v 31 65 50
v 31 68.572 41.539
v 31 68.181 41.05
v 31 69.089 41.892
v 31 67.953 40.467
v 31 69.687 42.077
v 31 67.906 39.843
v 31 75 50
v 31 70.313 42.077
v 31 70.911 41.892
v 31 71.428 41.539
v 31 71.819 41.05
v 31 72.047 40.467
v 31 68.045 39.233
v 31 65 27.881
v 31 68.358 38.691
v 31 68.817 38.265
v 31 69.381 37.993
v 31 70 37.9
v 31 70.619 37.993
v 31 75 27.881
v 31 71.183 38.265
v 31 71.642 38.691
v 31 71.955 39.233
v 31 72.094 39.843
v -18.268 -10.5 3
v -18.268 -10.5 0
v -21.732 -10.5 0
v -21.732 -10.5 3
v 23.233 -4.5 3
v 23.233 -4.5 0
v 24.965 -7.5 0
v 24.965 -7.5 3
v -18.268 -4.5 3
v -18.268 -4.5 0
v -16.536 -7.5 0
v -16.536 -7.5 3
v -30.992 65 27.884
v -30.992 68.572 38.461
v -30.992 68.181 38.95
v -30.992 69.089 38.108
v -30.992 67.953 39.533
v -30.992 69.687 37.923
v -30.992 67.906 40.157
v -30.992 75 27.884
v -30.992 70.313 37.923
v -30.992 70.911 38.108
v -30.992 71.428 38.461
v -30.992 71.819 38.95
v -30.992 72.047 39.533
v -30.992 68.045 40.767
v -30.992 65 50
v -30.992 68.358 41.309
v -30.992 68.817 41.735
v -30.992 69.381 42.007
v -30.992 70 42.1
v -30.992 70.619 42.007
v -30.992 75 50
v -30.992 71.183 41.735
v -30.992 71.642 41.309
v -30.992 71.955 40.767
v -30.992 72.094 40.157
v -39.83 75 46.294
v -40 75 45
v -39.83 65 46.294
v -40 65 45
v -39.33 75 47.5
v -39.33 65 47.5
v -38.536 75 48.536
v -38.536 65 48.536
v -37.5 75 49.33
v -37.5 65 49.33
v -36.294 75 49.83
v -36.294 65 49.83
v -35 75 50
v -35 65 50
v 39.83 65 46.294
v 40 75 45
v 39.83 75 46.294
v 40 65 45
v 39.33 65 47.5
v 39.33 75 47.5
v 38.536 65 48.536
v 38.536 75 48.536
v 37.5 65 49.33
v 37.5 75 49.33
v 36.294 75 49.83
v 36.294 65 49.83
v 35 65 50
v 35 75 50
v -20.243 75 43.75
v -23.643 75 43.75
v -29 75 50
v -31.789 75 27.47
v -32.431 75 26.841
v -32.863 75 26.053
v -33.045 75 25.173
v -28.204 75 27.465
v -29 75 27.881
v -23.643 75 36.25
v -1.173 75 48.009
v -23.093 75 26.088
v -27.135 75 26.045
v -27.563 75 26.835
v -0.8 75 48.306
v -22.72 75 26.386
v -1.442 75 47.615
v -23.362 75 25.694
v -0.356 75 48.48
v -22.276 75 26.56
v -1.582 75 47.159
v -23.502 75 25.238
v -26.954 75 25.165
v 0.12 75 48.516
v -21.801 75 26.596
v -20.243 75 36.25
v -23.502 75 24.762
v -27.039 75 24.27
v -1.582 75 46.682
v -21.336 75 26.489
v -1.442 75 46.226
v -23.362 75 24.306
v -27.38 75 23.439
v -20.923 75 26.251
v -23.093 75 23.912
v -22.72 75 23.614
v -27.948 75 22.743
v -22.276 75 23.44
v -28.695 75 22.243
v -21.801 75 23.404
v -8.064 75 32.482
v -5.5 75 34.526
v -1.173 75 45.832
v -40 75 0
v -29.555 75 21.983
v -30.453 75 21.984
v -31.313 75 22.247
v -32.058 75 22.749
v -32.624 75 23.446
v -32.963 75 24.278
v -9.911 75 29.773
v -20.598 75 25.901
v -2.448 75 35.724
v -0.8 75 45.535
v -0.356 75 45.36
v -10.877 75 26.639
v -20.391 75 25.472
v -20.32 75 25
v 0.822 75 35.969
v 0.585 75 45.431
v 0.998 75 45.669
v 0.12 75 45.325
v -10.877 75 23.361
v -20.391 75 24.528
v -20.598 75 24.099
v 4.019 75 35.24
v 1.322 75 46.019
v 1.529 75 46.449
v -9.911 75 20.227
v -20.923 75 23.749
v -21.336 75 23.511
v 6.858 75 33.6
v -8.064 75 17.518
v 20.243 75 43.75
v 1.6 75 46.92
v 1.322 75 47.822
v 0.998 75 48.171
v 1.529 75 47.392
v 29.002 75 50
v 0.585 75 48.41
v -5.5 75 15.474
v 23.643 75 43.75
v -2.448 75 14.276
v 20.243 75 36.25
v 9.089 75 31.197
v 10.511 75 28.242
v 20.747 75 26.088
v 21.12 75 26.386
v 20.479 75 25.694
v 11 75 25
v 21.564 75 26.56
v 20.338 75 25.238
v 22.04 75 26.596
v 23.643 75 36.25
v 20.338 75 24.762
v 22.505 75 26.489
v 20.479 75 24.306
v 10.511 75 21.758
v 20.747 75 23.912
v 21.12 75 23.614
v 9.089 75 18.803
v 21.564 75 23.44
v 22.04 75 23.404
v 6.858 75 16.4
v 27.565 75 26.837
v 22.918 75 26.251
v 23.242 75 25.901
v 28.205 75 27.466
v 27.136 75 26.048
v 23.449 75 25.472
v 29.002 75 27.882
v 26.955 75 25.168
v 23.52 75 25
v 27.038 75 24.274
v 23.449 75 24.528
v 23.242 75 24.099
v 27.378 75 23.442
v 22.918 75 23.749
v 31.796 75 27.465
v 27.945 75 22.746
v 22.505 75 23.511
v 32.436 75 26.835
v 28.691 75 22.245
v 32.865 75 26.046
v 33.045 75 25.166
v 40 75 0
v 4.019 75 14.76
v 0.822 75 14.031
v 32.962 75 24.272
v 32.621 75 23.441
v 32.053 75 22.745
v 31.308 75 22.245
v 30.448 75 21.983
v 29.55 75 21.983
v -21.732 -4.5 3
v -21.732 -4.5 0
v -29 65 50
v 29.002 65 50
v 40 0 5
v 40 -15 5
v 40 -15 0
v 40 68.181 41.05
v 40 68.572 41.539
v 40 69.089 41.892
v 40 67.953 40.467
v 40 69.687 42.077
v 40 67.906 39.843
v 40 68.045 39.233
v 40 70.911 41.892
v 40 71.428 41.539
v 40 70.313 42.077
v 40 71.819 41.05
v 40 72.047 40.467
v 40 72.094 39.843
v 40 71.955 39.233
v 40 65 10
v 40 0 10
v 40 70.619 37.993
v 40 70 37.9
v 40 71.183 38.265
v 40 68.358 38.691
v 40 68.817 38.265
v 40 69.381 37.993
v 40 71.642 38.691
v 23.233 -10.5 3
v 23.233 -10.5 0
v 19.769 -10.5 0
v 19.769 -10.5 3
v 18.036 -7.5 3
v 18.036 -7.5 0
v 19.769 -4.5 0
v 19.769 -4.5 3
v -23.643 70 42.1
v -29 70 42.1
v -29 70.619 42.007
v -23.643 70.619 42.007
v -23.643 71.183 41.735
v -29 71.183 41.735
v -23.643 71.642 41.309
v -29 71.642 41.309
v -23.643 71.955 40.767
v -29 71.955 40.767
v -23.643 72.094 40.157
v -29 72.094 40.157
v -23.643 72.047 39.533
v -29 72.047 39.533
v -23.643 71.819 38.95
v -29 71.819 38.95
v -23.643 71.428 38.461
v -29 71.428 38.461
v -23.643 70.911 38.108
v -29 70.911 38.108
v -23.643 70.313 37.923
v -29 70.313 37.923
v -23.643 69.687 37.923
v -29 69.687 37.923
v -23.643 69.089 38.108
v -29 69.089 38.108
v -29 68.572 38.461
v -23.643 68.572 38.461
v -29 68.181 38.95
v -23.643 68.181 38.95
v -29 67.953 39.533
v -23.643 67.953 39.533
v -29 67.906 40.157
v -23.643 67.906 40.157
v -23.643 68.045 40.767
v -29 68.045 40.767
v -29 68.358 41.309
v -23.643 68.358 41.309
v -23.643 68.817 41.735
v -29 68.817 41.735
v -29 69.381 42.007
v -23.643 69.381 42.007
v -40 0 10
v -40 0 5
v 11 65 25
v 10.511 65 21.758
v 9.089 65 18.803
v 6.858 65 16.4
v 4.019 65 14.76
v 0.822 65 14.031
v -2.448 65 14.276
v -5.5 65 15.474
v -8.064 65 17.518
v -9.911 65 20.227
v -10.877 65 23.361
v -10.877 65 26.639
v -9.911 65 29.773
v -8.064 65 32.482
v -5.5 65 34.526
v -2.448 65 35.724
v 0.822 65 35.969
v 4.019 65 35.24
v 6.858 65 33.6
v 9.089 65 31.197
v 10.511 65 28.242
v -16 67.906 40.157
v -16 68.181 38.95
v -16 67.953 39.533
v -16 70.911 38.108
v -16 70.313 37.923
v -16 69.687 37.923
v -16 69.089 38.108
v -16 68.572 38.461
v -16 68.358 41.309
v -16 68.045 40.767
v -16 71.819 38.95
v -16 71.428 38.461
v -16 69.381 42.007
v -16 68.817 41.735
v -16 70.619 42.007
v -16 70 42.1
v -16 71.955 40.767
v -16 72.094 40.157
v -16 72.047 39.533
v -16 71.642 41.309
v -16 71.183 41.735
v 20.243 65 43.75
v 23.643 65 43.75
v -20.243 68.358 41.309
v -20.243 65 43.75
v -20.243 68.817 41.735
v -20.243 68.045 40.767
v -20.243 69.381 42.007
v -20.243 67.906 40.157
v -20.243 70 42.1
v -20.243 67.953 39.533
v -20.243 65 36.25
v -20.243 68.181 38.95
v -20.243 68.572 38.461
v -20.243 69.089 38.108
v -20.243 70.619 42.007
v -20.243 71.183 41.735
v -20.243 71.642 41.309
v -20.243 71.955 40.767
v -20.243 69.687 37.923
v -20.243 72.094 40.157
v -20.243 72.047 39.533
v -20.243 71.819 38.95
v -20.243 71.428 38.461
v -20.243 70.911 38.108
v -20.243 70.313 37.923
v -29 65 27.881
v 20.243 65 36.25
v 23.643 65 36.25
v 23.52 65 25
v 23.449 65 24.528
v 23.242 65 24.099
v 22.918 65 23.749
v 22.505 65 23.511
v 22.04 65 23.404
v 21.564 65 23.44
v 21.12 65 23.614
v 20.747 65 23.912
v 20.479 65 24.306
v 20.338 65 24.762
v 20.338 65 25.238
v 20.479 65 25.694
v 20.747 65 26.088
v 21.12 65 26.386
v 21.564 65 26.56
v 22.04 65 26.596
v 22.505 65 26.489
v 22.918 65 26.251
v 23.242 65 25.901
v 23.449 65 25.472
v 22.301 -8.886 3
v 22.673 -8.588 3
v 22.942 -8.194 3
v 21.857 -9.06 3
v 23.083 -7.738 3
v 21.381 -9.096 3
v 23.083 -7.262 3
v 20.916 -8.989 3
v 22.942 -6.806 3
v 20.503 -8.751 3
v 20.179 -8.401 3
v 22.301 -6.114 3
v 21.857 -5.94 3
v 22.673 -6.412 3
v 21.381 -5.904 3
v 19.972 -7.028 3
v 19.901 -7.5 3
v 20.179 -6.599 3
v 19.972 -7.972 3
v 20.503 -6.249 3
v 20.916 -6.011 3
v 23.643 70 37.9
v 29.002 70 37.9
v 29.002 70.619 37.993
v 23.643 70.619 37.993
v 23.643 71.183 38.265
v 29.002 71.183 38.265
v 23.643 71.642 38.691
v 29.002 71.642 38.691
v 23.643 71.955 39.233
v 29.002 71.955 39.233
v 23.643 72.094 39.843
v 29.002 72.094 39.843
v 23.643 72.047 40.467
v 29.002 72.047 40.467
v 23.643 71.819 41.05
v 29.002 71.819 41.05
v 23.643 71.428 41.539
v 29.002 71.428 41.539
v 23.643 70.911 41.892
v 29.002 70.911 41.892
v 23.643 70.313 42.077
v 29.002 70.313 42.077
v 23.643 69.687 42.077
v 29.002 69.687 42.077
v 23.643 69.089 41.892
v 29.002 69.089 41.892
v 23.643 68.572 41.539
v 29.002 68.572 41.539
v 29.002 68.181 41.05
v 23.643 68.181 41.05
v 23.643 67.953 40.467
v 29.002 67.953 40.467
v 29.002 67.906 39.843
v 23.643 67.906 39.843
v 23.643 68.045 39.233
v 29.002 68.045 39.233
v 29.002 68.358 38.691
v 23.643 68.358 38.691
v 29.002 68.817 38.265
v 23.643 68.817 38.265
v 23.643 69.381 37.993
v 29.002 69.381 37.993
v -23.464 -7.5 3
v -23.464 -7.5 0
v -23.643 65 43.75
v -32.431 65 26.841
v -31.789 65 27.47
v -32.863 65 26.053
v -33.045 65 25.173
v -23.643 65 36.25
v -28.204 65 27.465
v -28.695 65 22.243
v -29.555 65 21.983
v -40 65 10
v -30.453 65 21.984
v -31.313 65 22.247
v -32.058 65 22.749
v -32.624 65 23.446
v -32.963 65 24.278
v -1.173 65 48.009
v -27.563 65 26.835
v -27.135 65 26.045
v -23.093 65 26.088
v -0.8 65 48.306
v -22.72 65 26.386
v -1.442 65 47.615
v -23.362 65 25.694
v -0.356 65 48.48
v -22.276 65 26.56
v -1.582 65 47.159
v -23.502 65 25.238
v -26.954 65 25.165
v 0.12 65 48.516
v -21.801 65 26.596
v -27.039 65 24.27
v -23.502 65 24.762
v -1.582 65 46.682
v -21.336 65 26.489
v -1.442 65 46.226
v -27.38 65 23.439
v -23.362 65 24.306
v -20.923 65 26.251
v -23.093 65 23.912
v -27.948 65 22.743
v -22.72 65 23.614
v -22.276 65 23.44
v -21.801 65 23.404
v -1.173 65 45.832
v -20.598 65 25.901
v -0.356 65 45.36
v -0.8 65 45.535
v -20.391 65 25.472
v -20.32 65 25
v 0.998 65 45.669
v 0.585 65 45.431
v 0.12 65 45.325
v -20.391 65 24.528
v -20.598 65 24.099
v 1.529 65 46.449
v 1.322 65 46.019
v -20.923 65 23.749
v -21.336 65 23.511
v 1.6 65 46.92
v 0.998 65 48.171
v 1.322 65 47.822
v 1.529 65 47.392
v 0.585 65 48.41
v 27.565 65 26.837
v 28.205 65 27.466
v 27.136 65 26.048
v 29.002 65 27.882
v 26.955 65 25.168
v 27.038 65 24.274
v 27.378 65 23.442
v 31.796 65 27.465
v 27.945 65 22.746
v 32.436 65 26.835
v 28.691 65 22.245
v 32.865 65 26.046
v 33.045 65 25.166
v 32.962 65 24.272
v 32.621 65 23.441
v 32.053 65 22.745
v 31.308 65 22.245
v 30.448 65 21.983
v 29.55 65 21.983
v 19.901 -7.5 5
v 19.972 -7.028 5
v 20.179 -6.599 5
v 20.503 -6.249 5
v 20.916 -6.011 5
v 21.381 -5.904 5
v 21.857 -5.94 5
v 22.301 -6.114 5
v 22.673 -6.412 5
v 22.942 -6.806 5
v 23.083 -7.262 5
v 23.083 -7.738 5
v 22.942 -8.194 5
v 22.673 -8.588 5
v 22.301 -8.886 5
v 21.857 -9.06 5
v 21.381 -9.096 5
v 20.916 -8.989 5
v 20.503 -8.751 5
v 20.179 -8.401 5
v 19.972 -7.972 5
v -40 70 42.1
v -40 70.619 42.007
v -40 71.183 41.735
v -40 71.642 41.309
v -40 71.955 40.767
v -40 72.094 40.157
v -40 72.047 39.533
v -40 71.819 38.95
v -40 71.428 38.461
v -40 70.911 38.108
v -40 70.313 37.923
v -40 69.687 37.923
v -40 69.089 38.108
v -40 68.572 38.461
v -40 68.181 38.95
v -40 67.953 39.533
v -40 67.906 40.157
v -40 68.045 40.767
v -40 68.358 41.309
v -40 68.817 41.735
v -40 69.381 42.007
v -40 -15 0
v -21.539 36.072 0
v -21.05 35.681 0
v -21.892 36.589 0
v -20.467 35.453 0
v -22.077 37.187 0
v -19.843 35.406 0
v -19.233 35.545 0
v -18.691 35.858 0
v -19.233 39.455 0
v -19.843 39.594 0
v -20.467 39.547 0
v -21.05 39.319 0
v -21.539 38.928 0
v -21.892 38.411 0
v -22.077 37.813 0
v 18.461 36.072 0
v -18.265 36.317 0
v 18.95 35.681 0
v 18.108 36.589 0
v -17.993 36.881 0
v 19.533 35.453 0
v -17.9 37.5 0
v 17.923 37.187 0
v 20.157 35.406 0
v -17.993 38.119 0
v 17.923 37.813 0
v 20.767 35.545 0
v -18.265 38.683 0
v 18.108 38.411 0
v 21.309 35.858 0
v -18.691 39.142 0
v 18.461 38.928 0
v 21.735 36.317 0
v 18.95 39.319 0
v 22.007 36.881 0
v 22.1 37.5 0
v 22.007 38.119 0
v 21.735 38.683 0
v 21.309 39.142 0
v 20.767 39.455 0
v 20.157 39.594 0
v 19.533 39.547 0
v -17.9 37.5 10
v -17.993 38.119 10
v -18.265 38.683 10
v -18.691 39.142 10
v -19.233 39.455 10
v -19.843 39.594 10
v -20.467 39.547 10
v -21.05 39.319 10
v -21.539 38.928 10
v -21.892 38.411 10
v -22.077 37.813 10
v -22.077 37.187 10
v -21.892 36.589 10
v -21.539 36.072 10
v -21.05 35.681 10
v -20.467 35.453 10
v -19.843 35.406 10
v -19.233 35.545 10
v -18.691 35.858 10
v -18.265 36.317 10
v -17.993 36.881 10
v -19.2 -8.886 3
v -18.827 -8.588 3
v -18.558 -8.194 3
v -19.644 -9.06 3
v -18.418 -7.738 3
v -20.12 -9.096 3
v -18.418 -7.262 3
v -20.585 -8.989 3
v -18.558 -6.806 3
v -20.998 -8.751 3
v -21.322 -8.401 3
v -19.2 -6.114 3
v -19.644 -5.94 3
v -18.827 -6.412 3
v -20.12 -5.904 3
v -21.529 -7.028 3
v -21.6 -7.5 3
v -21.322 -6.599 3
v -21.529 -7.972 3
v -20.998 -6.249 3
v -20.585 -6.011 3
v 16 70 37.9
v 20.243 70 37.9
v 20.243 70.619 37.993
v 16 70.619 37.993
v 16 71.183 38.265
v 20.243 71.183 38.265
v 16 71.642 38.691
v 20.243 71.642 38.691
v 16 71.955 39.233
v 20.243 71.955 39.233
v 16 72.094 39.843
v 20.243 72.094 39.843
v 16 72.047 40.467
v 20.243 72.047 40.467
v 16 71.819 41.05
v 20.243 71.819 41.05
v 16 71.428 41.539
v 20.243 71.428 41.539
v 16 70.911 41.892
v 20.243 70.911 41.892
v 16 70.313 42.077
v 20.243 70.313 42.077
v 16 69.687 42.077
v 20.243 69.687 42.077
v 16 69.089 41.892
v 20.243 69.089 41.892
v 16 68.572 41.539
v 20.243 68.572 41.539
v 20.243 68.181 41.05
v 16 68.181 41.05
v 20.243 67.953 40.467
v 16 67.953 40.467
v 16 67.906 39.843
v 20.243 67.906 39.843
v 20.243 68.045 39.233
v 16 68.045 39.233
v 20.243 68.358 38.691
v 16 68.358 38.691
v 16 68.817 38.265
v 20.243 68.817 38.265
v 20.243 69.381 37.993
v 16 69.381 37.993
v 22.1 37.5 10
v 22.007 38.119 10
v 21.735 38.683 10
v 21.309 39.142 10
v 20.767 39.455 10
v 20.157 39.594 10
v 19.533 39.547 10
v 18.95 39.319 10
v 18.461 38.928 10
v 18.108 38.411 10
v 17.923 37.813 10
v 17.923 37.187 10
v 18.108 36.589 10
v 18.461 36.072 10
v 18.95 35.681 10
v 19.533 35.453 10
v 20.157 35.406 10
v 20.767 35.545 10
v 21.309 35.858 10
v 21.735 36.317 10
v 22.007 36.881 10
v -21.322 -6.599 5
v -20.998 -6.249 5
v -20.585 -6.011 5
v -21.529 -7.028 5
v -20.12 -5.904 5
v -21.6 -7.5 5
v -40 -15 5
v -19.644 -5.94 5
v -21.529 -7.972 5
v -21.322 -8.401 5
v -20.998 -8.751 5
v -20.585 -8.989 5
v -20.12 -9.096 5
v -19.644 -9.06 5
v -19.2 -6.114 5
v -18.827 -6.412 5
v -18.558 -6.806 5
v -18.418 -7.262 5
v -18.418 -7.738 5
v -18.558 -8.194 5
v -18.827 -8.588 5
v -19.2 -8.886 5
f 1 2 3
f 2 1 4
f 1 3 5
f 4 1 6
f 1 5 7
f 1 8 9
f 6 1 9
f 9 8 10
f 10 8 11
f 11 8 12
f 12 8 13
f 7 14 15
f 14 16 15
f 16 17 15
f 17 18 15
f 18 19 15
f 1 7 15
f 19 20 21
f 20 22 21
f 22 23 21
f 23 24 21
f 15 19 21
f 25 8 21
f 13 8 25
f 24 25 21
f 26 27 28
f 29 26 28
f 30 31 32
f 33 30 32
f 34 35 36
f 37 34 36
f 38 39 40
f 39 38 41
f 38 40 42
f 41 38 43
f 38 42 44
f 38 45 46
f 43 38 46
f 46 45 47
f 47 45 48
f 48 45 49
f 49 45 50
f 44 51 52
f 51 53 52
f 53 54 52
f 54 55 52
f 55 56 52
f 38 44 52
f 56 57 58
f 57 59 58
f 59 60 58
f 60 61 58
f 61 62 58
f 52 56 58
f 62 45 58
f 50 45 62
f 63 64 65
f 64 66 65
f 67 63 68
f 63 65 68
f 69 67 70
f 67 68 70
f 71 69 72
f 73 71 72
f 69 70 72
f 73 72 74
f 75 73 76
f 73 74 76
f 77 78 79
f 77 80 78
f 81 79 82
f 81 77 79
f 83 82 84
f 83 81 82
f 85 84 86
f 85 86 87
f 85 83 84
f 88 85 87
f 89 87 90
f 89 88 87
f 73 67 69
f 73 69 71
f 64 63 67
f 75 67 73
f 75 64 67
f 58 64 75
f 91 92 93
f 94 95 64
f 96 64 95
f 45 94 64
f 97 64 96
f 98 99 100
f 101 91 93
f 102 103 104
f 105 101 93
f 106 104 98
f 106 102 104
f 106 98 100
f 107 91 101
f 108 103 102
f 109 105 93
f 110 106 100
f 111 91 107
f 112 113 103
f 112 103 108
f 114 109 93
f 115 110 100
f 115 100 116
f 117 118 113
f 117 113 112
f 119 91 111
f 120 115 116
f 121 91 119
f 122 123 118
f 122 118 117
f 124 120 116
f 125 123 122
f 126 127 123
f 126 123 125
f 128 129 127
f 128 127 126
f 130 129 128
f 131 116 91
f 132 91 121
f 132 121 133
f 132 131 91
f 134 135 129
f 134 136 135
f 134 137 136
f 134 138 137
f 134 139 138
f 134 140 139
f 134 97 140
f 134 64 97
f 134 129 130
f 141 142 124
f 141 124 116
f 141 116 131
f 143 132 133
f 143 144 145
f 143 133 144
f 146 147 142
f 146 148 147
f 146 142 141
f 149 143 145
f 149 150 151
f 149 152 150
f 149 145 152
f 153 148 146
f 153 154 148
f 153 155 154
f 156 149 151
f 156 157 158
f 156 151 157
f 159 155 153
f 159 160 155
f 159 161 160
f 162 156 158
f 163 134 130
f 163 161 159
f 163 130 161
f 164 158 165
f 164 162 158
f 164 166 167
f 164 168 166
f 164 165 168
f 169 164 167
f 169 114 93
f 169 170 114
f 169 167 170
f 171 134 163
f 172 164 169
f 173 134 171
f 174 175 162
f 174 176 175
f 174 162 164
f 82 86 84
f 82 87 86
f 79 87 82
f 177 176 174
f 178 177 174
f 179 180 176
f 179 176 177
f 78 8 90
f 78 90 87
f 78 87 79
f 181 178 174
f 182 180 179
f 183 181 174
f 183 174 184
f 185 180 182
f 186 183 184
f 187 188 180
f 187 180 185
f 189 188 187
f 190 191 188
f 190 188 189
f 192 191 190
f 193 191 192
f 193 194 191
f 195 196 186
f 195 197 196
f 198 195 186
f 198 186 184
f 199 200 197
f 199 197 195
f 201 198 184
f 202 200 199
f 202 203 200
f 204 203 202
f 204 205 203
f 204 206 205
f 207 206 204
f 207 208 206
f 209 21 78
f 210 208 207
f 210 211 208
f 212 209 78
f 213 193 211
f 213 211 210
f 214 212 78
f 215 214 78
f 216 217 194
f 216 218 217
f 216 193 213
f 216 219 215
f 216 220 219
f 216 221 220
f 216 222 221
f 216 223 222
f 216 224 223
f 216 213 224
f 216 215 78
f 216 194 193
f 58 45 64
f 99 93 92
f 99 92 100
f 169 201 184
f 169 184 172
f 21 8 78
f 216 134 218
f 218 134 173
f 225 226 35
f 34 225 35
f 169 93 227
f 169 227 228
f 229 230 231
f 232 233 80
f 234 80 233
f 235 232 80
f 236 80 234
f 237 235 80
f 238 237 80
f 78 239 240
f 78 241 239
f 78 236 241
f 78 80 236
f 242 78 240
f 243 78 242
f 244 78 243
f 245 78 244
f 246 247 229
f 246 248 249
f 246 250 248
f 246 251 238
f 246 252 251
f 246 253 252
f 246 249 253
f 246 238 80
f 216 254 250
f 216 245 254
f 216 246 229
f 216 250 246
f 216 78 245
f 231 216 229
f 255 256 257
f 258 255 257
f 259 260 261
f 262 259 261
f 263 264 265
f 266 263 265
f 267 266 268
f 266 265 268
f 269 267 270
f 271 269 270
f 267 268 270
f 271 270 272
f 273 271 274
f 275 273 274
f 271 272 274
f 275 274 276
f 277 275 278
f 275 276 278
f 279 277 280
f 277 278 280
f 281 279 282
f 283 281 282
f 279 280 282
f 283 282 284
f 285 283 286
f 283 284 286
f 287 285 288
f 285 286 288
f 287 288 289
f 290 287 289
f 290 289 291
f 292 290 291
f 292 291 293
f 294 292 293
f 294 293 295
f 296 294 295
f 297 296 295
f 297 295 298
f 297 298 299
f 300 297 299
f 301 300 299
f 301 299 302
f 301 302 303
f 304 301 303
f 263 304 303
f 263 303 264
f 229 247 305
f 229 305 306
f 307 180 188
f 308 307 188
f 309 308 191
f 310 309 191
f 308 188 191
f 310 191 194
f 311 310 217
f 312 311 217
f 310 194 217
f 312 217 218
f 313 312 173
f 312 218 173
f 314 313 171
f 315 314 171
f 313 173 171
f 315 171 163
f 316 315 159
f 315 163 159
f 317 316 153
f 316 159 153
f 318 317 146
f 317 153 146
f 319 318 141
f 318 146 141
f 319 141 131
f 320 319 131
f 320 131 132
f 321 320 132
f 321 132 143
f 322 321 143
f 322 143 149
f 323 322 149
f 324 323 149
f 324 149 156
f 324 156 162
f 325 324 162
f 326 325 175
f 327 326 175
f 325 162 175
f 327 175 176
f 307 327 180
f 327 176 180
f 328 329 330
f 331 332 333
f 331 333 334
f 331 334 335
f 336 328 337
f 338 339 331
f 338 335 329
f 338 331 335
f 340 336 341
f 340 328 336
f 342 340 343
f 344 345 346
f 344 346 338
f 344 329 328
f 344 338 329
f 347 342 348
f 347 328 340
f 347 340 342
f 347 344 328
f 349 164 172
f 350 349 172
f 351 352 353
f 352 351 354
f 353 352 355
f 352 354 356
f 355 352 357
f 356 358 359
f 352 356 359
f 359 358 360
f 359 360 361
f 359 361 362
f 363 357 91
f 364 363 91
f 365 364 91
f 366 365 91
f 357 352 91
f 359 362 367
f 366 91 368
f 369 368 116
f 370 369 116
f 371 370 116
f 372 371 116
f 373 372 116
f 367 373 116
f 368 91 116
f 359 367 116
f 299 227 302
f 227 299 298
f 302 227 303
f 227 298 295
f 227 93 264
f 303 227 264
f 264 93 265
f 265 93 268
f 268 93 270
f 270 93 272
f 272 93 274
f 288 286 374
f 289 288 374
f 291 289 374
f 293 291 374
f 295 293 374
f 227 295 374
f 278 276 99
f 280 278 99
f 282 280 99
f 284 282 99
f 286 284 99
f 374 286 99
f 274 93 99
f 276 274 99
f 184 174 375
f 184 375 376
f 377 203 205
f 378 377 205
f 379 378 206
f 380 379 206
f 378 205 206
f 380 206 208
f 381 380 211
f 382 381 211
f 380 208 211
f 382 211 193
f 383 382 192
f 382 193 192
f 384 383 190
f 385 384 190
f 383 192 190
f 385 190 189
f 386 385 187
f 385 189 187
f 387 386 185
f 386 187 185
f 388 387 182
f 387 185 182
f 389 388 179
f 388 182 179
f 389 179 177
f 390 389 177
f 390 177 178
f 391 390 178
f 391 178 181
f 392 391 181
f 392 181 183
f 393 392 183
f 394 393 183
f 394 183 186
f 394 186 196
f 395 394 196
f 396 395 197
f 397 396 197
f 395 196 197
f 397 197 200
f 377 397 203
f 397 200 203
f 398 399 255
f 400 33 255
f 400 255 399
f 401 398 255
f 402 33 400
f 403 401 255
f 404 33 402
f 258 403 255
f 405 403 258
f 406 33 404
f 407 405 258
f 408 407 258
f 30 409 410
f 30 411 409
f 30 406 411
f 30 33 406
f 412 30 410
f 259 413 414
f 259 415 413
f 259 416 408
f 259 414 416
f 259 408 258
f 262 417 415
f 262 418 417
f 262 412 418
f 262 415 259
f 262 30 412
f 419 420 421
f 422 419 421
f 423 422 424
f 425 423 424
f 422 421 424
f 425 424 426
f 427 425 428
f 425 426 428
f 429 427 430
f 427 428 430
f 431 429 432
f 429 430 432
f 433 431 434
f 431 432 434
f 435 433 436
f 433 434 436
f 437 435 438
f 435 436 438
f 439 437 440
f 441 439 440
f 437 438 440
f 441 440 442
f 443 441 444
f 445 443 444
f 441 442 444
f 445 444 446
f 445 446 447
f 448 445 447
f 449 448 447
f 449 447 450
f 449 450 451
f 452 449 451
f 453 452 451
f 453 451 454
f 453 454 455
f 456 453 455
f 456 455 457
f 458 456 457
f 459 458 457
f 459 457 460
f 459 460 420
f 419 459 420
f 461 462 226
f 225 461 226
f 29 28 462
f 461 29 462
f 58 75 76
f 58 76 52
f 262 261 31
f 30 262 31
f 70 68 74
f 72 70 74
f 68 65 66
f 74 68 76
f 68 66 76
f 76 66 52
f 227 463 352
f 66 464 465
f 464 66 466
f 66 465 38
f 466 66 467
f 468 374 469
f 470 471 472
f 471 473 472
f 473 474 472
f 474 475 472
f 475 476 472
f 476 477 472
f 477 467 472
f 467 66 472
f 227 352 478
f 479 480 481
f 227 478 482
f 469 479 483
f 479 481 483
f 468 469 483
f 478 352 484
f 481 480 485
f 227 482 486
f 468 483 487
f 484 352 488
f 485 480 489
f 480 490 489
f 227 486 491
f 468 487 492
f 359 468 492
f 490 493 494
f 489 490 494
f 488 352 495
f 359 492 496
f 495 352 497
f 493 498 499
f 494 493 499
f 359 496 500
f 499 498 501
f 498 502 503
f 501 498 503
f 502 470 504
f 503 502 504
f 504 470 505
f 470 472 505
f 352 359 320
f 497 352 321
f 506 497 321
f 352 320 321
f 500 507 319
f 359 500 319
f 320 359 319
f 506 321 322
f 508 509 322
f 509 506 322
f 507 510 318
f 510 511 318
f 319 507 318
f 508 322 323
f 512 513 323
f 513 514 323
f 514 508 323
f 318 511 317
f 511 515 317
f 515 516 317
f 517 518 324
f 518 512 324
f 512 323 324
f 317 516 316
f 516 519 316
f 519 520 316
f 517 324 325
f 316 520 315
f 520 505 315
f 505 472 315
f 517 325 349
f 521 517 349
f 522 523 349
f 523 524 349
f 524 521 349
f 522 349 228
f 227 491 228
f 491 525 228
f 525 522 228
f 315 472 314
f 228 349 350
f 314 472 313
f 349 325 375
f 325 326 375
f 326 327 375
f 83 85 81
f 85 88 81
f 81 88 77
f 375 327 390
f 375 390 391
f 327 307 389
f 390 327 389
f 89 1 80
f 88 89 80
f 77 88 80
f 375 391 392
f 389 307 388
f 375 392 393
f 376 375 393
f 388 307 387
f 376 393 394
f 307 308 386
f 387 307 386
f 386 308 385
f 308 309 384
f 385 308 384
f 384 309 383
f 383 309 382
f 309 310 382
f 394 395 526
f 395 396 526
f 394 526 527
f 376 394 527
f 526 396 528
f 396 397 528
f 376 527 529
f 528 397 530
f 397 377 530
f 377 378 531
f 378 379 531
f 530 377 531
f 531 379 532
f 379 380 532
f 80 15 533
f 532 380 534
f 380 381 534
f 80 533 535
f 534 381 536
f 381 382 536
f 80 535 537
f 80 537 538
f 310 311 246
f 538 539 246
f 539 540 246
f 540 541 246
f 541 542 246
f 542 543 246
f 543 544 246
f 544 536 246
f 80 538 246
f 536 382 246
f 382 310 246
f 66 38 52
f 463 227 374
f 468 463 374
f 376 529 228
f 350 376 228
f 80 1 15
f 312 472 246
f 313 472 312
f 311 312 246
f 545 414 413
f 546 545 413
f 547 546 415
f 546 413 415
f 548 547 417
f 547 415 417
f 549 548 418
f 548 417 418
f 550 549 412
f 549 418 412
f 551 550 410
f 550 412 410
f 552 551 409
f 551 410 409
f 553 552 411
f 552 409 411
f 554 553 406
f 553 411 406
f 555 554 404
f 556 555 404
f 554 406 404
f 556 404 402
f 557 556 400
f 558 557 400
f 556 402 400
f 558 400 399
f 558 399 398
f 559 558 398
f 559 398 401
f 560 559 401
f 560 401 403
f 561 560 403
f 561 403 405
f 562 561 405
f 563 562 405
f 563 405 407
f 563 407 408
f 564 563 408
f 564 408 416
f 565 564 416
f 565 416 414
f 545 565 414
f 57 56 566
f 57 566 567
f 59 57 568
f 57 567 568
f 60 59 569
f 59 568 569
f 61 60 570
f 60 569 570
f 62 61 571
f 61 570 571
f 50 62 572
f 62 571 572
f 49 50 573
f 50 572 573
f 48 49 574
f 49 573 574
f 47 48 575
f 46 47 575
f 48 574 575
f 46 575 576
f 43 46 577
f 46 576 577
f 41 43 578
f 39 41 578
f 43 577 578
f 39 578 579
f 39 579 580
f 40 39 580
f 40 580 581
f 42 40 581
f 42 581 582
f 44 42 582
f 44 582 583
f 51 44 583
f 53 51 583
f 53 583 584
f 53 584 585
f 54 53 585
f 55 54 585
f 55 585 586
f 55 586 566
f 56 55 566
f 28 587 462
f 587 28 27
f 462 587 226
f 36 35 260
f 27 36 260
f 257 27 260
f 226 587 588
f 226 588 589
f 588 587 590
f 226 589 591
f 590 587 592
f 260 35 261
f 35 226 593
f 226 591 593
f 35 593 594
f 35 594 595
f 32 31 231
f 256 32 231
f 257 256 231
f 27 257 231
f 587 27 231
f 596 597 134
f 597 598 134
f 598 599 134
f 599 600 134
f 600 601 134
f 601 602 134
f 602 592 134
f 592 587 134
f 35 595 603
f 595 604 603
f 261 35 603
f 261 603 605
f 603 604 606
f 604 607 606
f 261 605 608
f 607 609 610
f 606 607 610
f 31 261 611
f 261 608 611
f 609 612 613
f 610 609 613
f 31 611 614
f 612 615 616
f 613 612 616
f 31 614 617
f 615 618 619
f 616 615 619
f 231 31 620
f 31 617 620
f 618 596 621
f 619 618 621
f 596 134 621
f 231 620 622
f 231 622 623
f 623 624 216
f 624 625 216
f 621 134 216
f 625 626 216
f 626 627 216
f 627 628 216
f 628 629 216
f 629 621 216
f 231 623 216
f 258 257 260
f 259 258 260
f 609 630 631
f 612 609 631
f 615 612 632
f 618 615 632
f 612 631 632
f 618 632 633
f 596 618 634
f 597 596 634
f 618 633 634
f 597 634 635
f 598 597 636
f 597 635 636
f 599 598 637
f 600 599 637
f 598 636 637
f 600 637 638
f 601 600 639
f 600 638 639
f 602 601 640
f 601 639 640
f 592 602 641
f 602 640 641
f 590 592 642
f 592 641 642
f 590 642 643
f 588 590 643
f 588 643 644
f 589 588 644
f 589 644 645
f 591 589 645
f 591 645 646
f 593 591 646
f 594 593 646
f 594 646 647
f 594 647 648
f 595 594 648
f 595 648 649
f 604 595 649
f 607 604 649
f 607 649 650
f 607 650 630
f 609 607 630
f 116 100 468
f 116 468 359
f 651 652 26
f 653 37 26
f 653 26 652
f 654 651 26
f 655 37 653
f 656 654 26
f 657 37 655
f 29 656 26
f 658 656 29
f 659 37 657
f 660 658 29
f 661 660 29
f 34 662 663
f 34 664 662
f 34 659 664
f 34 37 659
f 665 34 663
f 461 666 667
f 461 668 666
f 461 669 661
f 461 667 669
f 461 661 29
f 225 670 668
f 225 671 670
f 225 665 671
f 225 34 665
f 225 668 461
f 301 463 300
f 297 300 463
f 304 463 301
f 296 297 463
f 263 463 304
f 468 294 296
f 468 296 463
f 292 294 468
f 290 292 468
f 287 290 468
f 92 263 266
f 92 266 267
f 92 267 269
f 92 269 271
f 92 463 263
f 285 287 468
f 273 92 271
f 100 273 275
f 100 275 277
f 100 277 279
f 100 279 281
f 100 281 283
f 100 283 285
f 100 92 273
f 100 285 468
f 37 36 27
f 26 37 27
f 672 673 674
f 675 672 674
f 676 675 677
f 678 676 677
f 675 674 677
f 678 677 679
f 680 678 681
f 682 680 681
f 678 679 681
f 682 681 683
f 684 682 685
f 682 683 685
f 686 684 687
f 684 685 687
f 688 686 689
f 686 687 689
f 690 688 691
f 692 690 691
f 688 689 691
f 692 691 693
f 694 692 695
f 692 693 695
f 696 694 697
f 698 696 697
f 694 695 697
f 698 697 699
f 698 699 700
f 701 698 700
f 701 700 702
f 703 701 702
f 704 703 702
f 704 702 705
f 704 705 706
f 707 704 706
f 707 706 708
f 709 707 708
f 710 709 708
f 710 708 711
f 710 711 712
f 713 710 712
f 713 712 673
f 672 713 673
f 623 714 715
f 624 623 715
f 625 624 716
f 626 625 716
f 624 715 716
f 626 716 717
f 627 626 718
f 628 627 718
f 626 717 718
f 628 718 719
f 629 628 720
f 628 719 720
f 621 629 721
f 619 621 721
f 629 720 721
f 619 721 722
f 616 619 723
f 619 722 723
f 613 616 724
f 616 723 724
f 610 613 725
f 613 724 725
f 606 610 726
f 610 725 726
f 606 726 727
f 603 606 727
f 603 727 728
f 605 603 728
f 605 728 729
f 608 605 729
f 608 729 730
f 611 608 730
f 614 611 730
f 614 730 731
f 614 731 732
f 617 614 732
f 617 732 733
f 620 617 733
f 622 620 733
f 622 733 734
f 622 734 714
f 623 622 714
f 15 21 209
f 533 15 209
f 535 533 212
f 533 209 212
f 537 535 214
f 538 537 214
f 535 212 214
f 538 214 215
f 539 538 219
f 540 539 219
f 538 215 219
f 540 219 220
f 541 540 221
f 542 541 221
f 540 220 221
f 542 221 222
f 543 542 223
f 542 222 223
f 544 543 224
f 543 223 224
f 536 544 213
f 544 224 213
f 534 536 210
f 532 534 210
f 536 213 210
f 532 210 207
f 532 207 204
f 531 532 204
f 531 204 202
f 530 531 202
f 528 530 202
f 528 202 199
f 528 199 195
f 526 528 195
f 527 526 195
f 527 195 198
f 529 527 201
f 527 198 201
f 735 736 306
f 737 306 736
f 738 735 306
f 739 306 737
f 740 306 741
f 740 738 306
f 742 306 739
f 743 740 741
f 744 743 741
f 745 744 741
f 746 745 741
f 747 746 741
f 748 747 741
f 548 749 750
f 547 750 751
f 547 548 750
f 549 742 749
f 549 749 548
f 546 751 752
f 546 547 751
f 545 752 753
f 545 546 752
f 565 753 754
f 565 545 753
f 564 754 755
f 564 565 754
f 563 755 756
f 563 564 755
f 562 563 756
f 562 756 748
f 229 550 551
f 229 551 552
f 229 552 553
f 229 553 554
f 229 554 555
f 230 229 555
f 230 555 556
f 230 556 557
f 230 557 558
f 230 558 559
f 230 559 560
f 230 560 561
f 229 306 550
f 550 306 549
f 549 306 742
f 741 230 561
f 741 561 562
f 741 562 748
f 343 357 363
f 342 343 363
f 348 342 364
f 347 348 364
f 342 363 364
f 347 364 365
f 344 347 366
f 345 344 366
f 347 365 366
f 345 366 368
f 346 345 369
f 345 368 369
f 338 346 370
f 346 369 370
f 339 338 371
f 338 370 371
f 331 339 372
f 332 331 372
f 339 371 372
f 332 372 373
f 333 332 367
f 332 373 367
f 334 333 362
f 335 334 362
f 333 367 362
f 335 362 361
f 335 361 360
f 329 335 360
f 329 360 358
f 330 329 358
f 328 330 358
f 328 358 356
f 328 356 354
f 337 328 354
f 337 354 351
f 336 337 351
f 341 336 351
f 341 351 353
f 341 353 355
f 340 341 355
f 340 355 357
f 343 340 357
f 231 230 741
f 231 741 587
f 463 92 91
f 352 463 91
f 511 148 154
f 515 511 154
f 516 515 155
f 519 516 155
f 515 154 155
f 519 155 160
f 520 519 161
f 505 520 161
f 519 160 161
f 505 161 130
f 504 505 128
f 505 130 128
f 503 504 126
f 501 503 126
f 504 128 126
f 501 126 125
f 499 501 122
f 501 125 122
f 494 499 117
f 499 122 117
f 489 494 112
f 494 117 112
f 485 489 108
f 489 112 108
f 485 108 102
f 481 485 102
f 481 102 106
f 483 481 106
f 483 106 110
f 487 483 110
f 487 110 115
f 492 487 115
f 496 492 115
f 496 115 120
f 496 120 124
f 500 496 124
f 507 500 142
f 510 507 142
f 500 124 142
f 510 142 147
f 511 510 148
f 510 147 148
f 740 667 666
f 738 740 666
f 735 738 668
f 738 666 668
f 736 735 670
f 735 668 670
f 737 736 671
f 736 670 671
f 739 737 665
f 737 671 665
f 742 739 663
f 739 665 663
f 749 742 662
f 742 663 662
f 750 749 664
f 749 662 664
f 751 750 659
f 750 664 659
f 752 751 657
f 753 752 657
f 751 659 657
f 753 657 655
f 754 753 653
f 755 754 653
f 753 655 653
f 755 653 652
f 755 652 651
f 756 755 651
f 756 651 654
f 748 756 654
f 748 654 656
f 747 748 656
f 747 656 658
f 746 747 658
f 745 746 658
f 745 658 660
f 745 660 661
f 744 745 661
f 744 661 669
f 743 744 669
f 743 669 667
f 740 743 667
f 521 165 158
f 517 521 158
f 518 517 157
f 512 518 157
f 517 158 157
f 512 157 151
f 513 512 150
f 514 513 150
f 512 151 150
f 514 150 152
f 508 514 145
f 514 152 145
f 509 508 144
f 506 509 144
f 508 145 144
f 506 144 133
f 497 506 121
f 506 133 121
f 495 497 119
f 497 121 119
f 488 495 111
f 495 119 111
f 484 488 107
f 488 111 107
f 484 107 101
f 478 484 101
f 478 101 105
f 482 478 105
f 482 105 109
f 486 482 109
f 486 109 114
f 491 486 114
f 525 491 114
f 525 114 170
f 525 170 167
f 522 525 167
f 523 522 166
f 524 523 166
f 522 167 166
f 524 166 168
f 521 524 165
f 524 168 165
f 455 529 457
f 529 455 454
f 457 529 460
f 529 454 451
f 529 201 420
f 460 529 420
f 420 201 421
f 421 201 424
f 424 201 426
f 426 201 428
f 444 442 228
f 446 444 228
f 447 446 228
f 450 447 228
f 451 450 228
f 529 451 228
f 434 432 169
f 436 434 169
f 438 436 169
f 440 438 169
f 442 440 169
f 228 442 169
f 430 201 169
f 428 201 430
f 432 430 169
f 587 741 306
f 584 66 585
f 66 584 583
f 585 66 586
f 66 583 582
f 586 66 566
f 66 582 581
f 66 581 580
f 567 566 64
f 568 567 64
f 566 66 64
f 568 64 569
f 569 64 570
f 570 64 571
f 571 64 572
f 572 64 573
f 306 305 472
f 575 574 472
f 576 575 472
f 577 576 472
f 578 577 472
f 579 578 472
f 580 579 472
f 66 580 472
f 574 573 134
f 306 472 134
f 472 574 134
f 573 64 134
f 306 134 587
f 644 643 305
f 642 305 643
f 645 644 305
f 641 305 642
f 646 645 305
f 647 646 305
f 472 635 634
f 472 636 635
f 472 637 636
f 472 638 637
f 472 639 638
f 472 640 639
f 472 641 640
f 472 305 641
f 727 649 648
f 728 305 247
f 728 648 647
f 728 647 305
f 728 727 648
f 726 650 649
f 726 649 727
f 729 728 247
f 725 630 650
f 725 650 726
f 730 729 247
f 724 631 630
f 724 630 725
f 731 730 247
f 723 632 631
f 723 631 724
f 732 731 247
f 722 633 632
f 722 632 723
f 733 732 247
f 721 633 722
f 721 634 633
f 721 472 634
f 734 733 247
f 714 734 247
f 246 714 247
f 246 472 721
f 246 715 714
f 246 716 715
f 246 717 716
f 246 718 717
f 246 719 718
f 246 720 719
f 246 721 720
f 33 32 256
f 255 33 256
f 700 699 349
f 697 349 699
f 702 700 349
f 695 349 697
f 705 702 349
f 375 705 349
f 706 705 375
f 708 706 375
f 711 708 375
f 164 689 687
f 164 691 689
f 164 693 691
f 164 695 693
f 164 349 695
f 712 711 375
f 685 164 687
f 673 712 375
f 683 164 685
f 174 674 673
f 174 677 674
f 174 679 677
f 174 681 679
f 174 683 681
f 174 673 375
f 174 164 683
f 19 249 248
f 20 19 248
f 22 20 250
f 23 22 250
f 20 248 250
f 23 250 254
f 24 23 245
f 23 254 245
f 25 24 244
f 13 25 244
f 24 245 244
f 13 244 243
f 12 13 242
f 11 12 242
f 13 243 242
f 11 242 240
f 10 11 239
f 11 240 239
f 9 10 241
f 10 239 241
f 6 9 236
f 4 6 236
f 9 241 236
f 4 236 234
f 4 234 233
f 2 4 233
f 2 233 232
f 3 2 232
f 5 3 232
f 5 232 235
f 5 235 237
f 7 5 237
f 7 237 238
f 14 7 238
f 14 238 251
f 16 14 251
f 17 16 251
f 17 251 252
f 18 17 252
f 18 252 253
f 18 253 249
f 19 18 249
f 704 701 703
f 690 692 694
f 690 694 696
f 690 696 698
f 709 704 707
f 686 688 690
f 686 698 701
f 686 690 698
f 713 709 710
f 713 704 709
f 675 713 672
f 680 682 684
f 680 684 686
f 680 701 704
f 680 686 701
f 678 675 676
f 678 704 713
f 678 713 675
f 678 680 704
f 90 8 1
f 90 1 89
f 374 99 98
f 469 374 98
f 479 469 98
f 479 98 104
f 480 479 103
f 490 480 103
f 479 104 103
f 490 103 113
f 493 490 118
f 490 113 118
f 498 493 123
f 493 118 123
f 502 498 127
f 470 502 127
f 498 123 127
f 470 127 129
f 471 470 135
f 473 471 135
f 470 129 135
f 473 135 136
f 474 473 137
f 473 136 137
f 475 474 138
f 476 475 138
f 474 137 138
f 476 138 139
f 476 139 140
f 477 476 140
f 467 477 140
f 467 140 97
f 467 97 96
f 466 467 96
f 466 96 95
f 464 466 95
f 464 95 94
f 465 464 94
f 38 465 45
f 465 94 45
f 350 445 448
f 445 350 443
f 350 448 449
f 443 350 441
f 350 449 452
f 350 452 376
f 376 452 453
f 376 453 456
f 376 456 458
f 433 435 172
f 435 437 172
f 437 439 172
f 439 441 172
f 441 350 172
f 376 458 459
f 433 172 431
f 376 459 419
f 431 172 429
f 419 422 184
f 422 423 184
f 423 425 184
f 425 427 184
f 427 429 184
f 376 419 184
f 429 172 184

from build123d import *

# Parameters (mm, degrees)
SKETCH_1_W           = 80
SKETCH_1_H           = 150
EXTRUDE_1_DEPTH      = 10
SKETCH_4_R           = 11.25
EXTRUDE_3_DEPTH      = 10
SKETCH_5_R           = 11.25
SKETCH_5_R_2         = 5
EXTRUDE_4_DEPTH      = 4
SKETCH_6_R           = 2.1
CUT_EXTRUDE_1_DEPTH  = 24
SKETCH_7_W           = 3.4
SKETCH_7_H           = 7.5
CUT_EXTRUDE_2_DEPTH  = 24
SKETCH_8_R           = 2.1
CUT_EXTRUDE_3_DEPTH  = 24
SKETCH_9_W           = 80
SKETCH_9_H           = 40
SKETCH_9_R           = 11
SKETCH_9_R_2         = 1.6
EXTRUDE_5_DEPTH      = 10
FILLET_1_R           = 5
SKETCH_10_W          = 3.4
SKETCH_10_H          = 7.5
CUT_EXTRUDE_5_DEPTH  = 10
SKETCH_11_R          = 2.1
CUT_EXTRUDE_6_DEPTH  = 24
SKETCH_12_R          = 2.1
CUT_EXTRUDE_7_DEPTH  = 24
SKETCH_14_W          = 4
SKETCH_14_H          = 2
CUT_EXTRUDE_9_DEPTH  = 10
SKETCH_16_R          = 2.1
CUT_EXTRUDE_10_DEPTH = 11
CUT_EXTRUDE_12_DEPTH = 81
CUT_EXTRUDE_13_DEPTH = 3
SKETCH_20_R          = 1.6
CUT_EXTRUDE_15_DEPTH = 20


with BuildPart() as part:
    # 草圖1 → 填料-伸長1 (new body)
    with BuildSketch(Plane.XY):
        Rectangle(SKETCH_1_W, SKETCH_1_H)
    extrude(amount=EXTRUDE_1_DEPTH)

    # 草圖4 → 填料-伸長3 (add)
    with BuildSketch(Plane.XZ.offset(75)):
        with BuildLine():
            ThreePointArc((-6, 49), (0, 43), (6, 49))
            Line((6, 49), (6, 50))
            Line((6, 50), (29, 50))
            Line((29, 50), (29, 27.881405907))
            ThreePointArc((29, 27.881405907), (30, 21.95), (31, 27.881405907))
            Line((31, 27.881405907), (31, 50))
            Line((31, 50), (40, 50))
            Line((40, 50), (40, 10))
            Line((40, 10), (-40, 10))
            Line((-40, 10), (-40, 50))
            Line((-40, 50), (-31, 50))
            Line((-31, 50), (-31, 27.881405907))
            ThreePointArc((-31, 27.881405907), (-30, 21.95), (-29, 27.881405907))
            Line((-29, 27.881405907), (-29, 50))
            Line((-29, 50), (-6, 50))
            Line((-6, 50), (-6, 49))
        make_face()
        with Locations((0, 25)):
            Circle(SKETCH_4_R, mode=Mode.SUBTRACT)
    extrude(amount=-EXTRUDE_3_DEPTH)

    # 草圖5 → 填料-伸長4 (add)
    with BuildSketch(Plane.XZ.offset(75)):
        with Locations((0, 25)):
            Circle(SKETCH_5_R)
        with Locations((0, 25)):
            Circle(SKETCH_5_R_2, mode=Mode.SUBTRACT)
    extrude(amount=-EXTRUDE_4_DEPTH)

    # 草圖6 → 除料-伸長1 (cut)
    with BuildSketch(Plane(origin=(40, 0, 0), x_dir=(0, 0, -1), z_dir=(1, 0, 0))):
        with Locations((-40, -70)):
            Circle(SKETCH_6_R)
    extrude(amount=-CUT_EXTRUDE_1_DEPTH, mode=Mode.SUBTRACT)

    # 草圖7 → 除料-伸長2 (cut)
    with BuildSketch(Plane.XZ.offset(75)):
        with Locations((-21.943112787, 40)):
            Rectangle(SKETCH_7_W, SKETCH_7_H)
        with Locations((21.943112787, 40)):
            Rectangle(SKETCH_7_W, SKETCH_7_H)
    extrude(amount=-CUT_EXTRUDE_2_DEPTH, mode=Mode.SUBTRACT)

    # 草圖8 → 除料-伸長3 (cut)
    with BuildSketch(Plane.ZY.offset(40)):
        with Locations((40, -70)):
            Circle(SKETCH_8_R)
    extrude(amount=-CUT_EXTRUDE_3_DEPTH, mode=Mode.SUBTRACT)

    # 草圖9 → 填料-伸長5 (add)
    with BuildSketch(Plane(origin=(0, 75, 0), x_dir=(1, 0, 0), z_dir=(0, 1, 0))):
        with Locations((0, -30)):
            Rectangle(SKETCH_9_W, SKETCH_9_H)
        with Locations((0, -25)):
            Circle(SKETCH_9_R, mode=Mode.SUBTRACT)
        with Locations((-21.920310217, -25)):
            Circle(SKETCH_9_R_2, mode=Mode.SUBTRACT)
        with Locations((0, -46.920310217)):
            Circle(SKETCH_9_R_2, mode=Mode.SUBTRACT)
        with Locations((21.920310217, -25)):
            Circle(SKETCH_9_R_2, mode=Mode.SUBTRACT)
    extrude(amount=-EXTRUDE_5_DEPTH)

    # 圓角1
    fillet_1_edges = [part.edges().sort_by_distance(p)[0] for p in [
        (40, 70, 50),
        (-40, 70, 50),
        (40, -70, 50),
        (-40, -70, 50),
    ]]
    fillet(fillet_1_edges, radius=FILLET_1_R)

    # 草圖10 → 除料-伸長5 (cut)
    with BuildSketch(Plane(origin=(0, 75, 0), x_dir=(1, 0, 0), z_dir=(0, 1, 0))):
        with BuildLine():
            Line((-30.992105359, -72.117230176), (-29, -72.117230176))
            Line((-29, -72.117230176), (-29, -27.881405907))
            ThreePointArc((-29, -27.881405907), (-30.004176302, -21.950002859), (-30.992105359, -27.884133658))
            Line((-30.992105359, -27.884133658), (-30.992105359, -72.117230176))
        make_face()
        with BuildLine():
            Line((29.001577897, -72.118320527), (31, -72.118320527))
            Line((31, -72.118320527), (31, -27.881405907))
            ThreePointArc((31, -27.881405907), (29.999164969, -21.950000114), (29.001577897, -27.881953036))
            Line((29.001577897, -27.881953036), (29.001577897, -72.118320527))
        make_face()
        with Locations((-21.943112787, -40)):
            Rectangle(SKETCH_10_W, SKETCH_10_H)
        with Locations((21.943112787, -40)):
            Rectangle(SKETCH_10_W, SKETCH_10_H)
    extrude(amount=-CUT_EXTRUDE_5_DEPTH, mode=Mode.SUBTRACT)

    # 草圖11 → 除料-伸長6 (cut)
    with BuildSketch(Plane(origin=(40, 0, 0), x_dir=(0, 0, -1), z_dir=(1, 0, 0))):
        with Locations((-40, 70)):
            Circle(SKETCH_11_R)
    extrude(amount=-CUT_EXTRUDE_6_DEPTH, mode=Mode.SUBTRACT)

    # 草圖12 → 除料-伸長7 (cut)
    with BuildSketch(Plane.ZY.offset(40)):
        with Locations((40, 70)):
            Circle(SKETCH_12_R)
    extrude(amount=-CUT_EXTRUDE_7_DEPTH, mode=Mode.SUBTRACT)

    # 草圖14 → 除料-伸長9 (cut)
    with BuildSketch(Plane.XZ.offset(75)):
        with Locations((-12, 46)):
            Rectangle(SKETCH_14_W, SKETCH_14_H)
        with Locations((12, 46)):
            Rectangle(SKETCH_14_W, SKETCH_14_H)
    extrude(amount=-CUT_EXTRUDE_9_DEPTH, mode=Mode.SUBTRACT)

    # 草圖16 → 除料-伸長10 (cut, through all)
    with BuildSketch(Plane.XY.offset(10)):
        with Locations((-20, 37.5)):
            Circle(SKETCH_16_R)
        with Locations((20, 37.5)):
            Circle(SKETCH_16_R)
        with Locations((20, -37.5)):
            Circle(SKETCH_16_R)
        with Locations((-20, -37.5)):
            Circle(SKETCH_16_R)
    extrude(amount=-CUT_EXTRUDE_10_DEPTH, mode=Mode.SUBTRACT)

    # 草圖17 → 除料-伸長12 (cut, through all)
    with BuildSketch(Plane(origin=(40, 0, 0), x_dir=(0, 0, -1), z_dir=(1, 0, 0))):
        Polygon((-10, -15), (-13, -15), (-13, 0), (-5, 0), (-5, -15), (0, -15), (0, -75), (-50, -75), (-50, -65), (-10, -65), align=None)
    extrude(amount=-CUT_EXTRUDE_12_DEPTH, mode=Mode.SUBTRACT)

    # 草圖19 → 除料-伸長13 (cut)
    with BuildSketch(Plane(origin=(0, 0, 0), x_dir=(-1, 0, 0), z_dir=(0, 0, -1))):
        Polygon((-18.036462654, -7.5), (-19.768513462, -4.5), (-23.232615077, -4.5), (-24.964665884, -7.5), (-23.232615077, -10.5), (-19.768513462, -10.5), align=None)
        Polygon((23.464101615, -7.5), (21.732050808, -4.5), (18.267949192, -4.5), (16.535898385, -7.5), (18.267949192, -10.5), (21.732050808, -10.5), align=None)
    extrude(amount=-CUT_EXTRUDE_13_DEPTH, mode=Mode.SUBTRACT)

    # 草圖20 → 除料-伸長15 (cut)
    with BuildSketch(Plane(origin=(0, 0, 0), x_dir=(-1, 0, 0), z_dir=(0, 0, -1))):
        with Locations((-21.500564269, -7.5)):
            Circle(SKETCH_20_R)
        with Locations((20, -7.5)):
            Circle(SKETCH_20_R)
    extrude(amount=-CUT_EXTRUDE_15_DEPTH, mode=Mode.SUBTRACT)


solid = part.part
